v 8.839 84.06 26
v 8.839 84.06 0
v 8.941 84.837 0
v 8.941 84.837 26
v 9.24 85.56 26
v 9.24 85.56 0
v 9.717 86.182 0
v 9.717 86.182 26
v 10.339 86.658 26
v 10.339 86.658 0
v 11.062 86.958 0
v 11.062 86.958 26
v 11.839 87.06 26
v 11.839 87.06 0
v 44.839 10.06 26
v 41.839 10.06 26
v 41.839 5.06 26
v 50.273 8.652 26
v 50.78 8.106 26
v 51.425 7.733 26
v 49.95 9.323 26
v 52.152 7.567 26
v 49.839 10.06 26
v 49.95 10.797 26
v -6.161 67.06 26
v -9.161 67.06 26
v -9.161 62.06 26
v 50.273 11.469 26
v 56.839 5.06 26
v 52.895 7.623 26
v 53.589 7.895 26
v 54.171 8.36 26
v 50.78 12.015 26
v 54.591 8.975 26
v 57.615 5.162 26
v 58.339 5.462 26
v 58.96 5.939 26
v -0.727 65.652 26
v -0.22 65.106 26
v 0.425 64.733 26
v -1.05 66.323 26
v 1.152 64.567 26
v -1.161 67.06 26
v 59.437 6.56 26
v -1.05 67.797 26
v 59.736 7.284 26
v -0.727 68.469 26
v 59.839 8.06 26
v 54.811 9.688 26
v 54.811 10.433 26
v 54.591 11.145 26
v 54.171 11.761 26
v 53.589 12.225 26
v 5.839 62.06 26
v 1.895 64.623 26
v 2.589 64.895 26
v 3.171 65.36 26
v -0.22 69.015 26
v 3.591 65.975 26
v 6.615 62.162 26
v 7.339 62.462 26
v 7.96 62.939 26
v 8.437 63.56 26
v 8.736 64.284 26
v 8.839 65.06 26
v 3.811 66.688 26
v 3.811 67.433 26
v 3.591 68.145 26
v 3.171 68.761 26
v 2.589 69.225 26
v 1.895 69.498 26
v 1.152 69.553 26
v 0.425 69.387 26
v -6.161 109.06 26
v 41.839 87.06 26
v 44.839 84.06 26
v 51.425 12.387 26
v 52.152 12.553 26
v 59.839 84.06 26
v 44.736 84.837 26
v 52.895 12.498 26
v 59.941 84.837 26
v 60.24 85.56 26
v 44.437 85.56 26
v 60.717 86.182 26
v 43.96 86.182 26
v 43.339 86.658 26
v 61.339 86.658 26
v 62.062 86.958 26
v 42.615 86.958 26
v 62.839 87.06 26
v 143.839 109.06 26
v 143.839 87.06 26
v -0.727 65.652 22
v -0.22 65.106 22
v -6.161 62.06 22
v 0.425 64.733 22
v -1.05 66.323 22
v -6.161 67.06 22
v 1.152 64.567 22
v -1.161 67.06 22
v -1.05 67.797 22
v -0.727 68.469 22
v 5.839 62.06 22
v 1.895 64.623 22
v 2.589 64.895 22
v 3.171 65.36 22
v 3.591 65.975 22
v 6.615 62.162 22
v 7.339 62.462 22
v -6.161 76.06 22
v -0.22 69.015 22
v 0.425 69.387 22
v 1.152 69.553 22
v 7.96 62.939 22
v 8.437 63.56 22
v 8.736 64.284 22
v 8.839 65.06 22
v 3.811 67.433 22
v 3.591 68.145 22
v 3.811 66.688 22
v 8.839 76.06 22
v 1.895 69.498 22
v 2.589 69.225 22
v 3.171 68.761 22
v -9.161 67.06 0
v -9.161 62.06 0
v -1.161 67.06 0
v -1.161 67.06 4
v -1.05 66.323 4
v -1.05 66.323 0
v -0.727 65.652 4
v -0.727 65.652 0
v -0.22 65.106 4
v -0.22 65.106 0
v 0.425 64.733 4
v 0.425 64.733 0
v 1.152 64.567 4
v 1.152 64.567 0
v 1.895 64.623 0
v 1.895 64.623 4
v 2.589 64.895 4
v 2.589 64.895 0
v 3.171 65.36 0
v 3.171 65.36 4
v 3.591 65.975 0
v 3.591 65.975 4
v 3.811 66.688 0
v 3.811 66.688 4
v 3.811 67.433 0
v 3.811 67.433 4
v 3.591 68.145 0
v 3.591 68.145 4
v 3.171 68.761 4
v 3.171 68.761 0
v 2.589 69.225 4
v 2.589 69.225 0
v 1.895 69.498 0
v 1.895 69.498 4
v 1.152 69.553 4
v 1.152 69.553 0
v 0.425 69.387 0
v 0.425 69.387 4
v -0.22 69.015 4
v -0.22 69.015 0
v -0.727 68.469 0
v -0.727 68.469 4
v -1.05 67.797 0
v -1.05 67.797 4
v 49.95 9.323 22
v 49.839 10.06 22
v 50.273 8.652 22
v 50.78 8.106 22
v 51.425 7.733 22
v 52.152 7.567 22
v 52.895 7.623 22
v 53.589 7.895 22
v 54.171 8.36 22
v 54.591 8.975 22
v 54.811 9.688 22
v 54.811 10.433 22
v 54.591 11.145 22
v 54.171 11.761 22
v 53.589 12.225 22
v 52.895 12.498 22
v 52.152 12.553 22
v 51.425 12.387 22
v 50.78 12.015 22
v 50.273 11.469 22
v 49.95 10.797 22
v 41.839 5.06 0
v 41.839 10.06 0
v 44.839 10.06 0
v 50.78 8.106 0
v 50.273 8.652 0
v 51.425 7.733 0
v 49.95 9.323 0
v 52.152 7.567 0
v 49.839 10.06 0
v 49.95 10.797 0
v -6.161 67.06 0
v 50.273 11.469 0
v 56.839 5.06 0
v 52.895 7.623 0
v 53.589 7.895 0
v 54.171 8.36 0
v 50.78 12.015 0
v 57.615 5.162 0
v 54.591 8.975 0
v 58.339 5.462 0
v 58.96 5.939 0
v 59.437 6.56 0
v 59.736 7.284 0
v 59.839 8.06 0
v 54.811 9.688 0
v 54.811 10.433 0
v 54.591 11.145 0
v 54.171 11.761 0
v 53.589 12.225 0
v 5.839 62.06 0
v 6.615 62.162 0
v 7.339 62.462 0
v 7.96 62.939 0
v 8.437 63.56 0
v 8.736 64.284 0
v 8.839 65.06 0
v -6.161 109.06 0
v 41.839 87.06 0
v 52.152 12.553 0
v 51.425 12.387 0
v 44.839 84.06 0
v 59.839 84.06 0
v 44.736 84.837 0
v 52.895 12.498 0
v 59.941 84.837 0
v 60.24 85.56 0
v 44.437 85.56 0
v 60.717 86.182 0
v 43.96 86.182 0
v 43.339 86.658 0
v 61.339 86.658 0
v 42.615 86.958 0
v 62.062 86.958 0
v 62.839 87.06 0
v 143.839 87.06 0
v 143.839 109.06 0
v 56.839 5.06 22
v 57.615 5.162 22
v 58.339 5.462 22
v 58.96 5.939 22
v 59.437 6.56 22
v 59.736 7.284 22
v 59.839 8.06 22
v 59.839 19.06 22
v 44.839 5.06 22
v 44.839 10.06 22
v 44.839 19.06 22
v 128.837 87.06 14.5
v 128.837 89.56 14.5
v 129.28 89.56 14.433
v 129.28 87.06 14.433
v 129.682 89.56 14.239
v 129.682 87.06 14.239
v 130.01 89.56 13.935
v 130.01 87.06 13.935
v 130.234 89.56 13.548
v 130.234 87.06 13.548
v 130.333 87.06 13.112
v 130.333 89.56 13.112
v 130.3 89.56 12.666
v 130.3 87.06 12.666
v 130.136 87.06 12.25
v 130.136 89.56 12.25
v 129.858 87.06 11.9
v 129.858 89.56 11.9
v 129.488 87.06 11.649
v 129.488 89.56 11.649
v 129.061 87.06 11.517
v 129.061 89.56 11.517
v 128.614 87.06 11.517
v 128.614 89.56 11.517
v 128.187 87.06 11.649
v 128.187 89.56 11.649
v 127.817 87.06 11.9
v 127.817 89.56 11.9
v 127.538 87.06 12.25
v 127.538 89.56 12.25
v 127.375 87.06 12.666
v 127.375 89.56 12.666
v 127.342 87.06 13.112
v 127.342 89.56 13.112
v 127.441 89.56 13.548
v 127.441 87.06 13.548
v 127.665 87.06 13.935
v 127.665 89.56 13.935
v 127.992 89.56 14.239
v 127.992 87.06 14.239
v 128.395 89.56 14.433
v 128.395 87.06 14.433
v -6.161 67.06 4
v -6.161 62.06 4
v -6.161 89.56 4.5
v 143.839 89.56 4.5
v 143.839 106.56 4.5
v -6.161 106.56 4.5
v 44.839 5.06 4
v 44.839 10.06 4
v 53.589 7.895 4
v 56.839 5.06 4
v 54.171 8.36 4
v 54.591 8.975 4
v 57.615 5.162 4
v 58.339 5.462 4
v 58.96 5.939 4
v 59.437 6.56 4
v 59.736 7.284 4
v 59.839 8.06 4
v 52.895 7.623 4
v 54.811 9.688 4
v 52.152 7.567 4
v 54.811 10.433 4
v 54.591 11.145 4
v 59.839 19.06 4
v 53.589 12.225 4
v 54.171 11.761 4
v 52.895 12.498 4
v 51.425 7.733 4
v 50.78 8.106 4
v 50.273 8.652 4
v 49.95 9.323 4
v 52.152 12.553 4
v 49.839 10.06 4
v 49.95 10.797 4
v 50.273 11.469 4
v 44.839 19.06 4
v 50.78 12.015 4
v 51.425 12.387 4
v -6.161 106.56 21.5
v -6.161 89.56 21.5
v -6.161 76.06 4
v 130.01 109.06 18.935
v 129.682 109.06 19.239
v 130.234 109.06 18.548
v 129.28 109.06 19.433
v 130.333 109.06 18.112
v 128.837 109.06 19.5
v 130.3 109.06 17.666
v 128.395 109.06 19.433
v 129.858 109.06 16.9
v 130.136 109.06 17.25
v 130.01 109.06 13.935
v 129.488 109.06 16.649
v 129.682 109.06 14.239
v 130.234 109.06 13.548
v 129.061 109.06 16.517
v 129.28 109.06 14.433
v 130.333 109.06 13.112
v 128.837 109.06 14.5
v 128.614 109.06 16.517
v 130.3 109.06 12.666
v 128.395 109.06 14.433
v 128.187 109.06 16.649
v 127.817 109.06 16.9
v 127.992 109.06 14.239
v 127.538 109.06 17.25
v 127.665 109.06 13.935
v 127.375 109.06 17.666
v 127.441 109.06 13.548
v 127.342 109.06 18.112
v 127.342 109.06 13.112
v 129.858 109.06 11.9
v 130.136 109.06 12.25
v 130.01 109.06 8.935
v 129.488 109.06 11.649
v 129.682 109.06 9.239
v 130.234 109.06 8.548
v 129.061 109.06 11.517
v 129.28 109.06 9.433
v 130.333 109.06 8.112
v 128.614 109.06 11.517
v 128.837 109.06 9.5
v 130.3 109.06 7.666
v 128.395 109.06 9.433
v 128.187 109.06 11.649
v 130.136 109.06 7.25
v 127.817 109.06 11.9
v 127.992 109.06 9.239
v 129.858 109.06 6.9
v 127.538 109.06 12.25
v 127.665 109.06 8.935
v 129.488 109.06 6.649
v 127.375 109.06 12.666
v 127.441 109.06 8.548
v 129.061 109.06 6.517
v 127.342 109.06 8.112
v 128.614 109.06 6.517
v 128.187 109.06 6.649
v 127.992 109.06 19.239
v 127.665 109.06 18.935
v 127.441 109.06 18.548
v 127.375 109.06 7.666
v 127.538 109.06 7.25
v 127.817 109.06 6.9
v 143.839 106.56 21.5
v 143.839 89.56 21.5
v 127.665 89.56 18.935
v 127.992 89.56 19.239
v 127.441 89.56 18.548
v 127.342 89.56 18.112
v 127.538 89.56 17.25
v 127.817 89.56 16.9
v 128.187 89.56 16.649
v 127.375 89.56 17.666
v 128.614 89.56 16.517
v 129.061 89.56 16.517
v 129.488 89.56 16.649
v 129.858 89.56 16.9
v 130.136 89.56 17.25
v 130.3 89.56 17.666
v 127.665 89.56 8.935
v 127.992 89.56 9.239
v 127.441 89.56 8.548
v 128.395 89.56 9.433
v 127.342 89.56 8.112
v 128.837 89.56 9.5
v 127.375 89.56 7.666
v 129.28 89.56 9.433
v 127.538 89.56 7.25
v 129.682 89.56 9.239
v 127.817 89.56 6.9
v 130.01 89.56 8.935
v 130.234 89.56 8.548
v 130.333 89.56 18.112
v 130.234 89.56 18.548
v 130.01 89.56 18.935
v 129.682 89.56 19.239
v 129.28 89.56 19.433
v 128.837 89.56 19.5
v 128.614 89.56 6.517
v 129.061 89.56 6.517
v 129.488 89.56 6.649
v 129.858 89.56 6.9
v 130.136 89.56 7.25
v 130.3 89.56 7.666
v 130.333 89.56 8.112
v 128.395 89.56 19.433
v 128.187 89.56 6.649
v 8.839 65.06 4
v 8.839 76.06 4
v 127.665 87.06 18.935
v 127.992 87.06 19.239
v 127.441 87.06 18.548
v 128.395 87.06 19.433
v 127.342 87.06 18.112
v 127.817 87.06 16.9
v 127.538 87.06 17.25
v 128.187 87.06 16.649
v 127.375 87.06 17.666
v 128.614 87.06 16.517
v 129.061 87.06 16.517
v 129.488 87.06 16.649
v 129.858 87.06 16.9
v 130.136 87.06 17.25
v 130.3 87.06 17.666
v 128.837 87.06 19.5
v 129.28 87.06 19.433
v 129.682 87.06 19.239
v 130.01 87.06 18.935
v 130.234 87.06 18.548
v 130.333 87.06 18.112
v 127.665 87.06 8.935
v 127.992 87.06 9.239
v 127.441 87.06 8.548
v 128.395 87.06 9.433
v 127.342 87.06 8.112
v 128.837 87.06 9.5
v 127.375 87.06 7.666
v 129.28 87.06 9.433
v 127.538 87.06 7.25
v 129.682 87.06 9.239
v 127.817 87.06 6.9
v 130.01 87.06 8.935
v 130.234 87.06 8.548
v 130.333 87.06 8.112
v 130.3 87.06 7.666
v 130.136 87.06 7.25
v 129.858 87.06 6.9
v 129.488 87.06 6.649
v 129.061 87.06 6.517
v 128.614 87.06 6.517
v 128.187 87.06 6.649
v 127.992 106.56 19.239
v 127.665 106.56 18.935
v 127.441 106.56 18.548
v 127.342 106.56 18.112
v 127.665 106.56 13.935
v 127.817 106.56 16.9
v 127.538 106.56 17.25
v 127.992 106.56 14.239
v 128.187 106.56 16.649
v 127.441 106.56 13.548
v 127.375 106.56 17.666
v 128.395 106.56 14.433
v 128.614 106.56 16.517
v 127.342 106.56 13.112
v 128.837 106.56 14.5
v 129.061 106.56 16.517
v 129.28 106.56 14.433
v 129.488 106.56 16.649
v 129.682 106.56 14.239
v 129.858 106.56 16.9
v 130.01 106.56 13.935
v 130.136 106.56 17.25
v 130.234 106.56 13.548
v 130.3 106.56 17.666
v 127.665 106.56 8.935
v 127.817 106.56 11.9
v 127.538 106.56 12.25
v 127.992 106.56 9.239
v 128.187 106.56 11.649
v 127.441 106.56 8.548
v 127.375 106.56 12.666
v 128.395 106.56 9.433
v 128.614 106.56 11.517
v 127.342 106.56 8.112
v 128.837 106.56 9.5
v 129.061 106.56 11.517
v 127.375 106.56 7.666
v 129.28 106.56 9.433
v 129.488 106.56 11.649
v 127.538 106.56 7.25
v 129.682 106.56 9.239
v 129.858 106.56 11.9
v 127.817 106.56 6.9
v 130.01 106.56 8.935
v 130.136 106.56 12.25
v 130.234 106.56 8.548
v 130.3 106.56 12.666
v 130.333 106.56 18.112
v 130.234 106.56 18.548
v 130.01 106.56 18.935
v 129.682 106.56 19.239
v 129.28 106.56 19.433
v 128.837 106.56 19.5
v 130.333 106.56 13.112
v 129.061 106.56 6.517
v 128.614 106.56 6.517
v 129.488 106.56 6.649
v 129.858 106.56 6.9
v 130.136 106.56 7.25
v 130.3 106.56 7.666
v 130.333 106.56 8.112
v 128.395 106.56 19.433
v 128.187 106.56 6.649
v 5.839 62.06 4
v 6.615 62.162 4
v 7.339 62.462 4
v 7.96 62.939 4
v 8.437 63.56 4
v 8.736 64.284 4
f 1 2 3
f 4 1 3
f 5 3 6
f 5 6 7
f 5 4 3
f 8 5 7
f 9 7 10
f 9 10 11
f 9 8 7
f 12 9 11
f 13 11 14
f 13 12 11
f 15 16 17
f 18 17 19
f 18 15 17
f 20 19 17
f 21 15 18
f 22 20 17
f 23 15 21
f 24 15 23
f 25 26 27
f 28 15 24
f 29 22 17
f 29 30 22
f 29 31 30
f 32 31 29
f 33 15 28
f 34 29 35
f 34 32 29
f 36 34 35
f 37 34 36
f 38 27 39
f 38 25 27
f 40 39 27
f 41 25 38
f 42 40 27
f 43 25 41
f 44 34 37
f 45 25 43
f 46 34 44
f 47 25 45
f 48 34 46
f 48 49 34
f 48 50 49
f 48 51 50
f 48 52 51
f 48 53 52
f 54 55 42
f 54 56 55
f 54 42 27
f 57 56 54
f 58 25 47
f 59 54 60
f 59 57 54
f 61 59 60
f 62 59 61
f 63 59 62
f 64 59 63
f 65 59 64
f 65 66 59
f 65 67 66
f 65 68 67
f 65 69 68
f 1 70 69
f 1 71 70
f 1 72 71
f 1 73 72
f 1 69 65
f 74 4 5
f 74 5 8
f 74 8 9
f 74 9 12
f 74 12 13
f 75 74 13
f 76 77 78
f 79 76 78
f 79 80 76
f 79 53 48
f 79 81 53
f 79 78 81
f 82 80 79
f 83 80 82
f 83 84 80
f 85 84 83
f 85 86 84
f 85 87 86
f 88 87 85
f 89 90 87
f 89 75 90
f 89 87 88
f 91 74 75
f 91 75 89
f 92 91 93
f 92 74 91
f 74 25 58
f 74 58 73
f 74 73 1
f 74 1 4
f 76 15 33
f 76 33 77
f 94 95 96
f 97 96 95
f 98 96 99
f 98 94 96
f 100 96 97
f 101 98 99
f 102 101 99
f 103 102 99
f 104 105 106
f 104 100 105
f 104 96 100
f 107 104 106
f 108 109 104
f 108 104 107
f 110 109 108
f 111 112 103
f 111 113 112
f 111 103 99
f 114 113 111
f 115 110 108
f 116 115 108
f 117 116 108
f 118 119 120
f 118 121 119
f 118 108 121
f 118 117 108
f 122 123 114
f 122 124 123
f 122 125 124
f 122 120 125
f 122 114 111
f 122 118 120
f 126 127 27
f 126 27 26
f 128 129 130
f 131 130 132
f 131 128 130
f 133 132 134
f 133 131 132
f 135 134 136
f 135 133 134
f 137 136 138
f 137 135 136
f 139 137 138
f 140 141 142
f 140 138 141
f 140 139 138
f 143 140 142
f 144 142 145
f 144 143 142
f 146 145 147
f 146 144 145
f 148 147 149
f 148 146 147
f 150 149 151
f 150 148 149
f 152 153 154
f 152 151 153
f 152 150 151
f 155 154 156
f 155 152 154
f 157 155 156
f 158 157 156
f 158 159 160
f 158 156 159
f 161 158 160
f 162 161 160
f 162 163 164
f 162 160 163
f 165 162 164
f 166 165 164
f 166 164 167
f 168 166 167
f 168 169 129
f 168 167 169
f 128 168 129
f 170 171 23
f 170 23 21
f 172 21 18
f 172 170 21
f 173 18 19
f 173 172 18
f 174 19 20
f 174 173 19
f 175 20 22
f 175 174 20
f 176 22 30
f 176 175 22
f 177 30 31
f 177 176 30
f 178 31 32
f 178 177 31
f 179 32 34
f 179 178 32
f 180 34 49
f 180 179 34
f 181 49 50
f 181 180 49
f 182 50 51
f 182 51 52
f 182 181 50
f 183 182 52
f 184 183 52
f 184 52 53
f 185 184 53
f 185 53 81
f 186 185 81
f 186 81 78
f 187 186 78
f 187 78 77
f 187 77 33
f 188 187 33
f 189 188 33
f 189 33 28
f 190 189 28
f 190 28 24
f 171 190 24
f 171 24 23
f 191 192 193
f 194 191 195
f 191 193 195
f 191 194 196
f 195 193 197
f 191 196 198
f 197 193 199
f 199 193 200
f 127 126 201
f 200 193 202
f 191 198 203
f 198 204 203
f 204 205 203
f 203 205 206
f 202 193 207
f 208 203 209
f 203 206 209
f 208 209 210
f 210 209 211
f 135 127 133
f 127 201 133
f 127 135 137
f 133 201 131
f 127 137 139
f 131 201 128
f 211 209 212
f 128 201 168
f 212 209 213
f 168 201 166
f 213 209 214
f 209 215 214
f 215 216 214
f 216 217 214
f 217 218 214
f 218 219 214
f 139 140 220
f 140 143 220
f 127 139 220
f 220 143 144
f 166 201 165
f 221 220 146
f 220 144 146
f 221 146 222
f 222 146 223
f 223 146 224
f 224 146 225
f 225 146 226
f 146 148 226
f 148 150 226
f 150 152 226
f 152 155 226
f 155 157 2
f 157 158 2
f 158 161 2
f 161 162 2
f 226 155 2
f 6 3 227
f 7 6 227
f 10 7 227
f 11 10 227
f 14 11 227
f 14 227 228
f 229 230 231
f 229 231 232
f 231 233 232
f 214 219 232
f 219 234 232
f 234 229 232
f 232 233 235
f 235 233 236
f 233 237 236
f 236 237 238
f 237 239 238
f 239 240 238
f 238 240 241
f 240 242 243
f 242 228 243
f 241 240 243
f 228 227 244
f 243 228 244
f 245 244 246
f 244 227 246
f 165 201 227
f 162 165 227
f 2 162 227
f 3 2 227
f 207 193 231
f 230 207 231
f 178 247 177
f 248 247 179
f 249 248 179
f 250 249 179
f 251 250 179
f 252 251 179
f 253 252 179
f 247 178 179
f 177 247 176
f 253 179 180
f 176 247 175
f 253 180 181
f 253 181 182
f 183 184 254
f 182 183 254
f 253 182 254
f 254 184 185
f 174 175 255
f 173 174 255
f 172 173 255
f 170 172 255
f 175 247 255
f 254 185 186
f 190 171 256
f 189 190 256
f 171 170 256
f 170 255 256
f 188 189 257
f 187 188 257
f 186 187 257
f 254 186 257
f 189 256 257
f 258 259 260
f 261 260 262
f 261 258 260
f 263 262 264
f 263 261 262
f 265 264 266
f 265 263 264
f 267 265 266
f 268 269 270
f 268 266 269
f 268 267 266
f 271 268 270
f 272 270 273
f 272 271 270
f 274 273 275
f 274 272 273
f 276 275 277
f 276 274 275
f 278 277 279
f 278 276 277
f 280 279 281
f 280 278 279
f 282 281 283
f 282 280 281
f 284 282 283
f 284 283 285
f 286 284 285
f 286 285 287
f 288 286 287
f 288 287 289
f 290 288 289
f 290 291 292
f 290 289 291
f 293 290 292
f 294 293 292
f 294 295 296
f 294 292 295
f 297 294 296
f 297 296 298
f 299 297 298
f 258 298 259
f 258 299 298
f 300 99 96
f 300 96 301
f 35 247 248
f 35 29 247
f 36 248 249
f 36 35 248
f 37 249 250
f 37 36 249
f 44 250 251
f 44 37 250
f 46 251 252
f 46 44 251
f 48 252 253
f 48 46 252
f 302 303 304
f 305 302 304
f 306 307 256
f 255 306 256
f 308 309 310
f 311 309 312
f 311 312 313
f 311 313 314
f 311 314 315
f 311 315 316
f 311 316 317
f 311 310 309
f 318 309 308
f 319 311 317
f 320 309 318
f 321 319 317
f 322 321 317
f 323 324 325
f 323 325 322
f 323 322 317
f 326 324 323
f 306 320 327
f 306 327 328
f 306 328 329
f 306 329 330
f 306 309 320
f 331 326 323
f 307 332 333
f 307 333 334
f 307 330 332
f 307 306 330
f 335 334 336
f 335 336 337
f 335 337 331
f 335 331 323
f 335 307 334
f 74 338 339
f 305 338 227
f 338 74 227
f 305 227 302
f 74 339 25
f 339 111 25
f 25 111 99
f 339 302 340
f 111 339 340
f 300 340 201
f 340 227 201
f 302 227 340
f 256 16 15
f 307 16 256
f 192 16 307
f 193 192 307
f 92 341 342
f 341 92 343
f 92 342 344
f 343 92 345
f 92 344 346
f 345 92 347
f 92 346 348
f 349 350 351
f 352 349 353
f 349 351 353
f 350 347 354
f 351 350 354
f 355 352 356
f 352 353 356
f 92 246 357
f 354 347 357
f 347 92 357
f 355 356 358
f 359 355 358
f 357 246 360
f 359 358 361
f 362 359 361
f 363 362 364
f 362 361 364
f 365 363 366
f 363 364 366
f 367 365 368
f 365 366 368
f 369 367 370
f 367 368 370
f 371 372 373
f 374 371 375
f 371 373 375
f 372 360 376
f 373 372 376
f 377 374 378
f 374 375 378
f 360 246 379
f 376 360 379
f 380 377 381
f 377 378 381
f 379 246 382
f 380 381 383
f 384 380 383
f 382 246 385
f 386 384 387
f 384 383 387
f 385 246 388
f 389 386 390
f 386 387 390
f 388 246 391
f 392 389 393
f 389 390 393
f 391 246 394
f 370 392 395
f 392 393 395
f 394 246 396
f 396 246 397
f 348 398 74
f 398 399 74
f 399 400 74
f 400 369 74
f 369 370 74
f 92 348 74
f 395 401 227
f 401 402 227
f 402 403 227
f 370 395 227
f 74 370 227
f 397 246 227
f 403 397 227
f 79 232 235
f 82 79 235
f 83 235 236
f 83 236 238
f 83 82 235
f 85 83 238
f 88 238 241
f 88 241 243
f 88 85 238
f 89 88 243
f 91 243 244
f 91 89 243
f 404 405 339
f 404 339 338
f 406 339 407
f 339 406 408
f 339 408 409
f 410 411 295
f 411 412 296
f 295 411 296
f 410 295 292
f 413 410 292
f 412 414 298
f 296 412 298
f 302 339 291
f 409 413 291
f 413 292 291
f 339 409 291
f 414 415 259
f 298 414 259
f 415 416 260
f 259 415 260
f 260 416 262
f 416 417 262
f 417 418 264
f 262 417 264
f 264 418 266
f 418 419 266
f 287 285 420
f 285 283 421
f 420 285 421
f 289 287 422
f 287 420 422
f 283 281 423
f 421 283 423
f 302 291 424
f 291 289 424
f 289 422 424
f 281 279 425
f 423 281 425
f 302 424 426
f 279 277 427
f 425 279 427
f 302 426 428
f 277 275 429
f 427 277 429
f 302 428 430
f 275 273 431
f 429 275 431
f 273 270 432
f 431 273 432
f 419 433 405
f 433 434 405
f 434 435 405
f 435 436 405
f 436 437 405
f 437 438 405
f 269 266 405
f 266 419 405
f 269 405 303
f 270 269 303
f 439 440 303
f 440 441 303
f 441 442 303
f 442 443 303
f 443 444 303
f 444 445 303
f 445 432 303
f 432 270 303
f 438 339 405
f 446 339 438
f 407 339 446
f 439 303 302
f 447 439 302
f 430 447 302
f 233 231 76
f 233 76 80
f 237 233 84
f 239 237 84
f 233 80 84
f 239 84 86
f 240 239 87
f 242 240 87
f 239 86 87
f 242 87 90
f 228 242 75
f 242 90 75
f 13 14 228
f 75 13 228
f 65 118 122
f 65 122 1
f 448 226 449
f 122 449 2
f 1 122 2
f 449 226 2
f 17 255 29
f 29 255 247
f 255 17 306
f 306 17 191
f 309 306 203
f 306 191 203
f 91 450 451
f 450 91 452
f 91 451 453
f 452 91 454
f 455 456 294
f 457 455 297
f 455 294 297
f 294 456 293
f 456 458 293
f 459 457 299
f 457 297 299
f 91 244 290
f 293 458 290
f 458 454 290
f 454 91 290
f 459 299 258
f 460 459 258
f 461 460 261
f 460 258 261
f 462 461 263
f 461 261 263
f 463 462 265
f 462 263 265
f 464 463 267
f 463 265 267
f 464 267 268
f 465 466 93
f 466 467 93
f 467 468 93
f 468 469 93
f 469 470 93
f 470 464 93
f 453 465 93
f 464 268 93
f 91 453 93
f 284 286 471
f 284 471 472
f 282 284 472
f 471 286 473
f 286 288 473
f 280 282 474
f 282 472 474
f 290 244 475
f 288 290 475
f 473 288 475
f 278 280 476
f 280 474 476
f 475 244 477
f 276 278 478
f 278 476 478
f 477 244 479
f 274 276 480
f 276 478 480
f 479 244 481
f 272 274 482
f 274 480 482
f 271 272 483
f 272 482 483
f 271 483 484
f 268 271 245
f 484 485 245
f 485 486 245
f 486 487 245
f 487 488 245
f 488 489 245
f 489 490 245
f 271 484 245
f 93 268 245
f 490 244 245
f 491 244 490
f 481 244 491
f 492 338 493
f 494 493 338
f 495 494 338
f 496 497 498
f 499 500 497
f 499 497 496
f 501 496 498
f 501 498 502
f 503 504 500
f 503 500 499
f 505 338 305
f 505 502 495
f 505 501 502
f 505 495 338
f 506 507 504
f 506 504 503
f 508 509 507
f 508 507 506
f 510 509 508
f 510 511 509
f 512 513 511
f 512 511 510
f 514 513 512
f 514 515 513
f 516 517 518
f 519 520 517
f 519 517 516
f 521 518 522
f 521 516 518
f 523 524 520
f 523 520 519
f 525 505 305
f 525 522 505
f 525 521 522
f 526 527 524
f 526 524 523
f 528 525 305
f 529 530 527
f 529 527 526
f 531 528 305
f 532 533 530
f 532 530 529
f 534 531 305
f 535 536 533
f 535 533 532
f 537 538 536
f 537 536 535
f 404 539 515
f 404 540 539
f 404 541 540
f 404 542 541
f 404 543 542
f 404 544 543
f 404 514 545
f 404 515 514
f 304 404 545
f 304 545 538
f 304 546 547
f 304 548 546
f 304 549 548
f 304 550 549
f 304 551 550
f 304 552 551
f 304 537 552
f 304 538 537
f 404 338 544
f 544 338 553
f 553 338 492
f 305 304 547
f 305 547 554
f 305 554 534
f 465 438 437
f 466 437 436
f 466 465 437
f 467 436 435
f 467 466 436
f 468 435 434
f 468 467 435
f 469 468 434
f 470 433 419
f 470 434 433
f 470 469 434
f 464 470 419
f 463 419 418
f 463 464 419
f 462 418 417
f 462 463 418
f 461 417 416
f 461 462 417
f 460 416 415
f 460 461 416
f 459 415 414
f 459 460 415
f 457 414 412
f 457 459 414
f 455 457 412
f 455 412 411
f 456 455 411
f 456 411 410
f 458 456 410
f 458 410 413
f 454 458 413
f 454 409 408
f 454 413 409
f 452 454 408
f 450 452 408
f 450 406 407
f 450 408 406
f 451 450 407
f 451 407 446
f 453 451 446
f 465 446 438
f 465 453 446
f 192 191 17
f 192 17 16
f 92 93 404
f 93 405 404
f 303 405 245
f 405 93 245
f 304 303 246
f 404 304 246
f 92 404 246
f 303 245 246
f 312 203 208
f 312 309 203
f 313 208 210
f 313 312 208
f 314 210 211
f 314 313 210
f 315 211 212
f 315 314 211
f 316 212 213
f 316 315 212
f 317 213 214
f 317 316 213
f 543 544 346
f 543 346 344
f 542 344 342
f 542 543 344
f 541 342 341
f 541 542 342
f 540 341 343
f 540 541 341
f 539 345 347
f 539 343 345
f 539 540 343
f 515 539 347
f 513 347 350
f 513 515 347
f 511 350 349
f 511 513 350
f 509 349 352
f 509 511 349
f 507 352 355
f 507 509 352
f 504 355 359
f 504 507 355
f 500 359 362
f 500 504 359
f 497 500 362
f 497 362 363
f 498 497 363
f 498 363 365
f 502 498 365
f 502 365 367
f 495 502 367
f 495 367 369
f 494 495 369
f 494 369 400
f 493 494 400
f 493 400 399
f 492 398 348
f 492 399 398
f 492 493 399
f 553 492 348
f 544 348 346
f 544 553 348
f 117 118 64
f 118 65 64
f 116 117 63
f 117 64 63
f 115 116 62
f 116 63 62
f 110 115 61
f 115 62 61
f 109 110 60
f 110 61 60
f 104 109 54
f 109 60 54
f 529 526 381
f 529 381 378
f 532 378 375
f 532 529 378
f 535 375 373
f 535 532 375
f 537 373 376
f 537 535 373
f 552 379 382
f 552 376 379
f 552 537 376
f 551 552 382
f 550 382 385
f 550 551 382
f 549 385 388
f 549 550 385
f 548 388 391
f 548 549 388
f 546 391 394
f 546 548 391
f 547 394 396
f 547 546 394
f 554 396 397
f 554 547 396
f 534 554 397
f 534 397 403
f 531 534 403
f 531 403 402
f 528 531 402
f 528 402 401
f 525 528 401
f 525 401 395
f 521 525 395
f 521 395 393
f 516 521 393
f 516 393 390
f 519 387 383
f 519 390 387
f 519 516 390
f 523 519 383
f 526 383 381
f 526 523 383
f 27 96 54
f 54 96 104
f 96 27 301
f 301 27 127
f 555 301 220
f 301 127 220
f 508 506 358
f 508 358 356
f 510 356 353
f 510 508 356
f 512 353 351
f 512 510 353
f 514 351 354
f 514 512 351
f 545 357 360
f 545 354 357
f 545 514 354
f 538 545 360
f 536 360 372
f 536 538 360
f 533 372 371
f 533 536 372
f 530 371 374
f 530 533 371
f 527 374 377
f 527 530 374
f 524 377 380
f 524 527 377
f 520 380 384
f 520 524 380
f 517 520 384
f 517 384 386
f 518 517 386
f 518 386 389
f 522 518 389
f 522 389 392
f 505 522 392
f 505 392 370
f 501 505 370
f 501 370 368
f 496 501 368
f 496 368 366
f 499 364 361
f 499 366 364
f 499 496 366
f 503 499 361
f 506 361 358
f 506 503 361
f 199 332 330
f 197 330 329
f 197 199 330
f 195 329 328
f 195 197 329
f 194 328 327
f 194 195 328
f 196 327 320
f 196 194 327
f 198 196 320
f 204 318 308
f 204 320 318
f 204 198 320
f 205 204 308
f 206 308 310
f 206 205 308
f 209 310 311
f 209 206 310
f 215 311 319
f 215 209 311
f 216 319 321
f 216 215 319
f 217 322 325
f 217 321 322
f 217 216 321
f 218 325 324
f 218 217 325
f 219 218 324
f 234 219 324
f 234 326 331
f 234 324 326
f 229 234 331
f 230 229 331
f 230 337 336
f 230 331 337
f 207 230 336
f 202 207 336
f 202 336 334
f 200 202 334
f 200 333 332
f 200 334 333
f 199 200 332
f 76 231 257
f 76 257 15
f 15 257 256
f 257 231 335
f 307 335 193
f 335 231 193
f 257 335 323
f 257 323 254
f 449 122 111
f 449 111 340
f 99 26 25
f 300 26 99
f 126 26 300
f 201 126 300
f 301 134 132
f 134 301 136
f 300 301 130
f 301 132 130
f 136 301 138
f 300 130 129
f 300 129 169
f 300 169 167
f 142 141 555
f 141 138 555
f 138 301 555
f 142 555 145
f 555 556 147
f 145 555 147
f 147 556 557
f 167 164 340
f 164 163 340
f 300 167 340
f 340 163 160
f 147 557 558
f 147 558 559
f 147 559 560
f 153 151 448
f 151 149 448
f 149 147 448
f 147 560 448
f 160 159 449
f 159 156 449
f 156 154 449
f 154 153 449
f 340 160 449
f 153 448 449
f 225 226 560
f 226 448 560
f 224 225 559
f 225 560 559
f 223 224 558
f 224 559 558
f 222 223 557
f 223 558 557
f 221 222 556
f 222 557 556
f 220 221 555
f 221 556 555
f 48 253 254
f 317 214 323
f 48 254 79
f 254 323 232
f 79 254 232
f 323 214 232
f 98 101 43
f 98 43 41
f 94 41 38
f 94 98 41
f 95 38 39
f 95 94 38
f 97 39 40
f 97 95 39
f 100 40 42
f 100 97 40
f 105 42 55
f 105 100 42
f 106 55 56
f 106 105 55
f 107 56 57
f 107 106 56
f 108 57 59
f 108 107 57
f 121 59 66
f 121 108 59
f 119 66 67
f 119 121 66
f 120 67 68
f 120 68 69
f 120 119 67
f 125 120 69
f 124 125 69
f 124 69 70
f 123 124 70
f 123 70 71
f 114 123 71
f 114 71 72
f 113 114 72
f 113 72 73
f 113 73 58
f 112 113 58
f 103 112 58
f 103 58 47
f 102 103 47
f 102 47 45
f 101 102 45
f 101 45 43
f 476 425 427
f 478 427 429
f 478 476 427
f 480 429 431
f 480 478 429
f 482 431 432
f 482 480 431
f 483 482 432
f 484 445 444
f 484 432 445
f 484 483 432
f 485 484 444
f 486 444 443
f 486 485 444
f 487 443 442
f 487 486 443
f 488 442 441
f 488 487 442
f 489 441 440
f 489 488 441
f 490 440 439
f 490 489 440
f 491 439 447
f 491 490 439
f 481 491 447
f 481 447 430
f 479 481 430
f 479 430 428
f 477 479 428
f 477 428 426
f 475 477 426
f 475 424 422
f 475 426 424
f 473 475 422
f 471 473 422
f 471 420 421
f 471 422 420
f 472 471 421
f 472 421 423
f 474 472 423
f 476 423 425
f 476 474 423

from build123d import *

# Parameters (mm, degrees)
SKETCH_1_R               = 2.5
SKETCH_1_W               = 3
SKETCH_1_H               = 5
EXTRUDE_2_DEPTH          = 26
CUT_EXTRUDE_3_REACH      = 151.57
SKETCH_5_W               = 18
SKETCH_5_H               = 14
CUT_EXTRUDE_5_DEPTH      = 180.392084627
CUT_EXTRUDE_5_DEPTH_BACK = 22
SKETCH_7_R               = 1.5
SKETCH_8_W               = 17
SKETCH_8_H               = 17
CUT_EXTRUDE_6_DEPTH      = 190.681647041
SKETCH_9_W               = 18
SKETCH_9_H               = 14
CUT_EXTRUDE_7_DEPTH      = 15
FILLET_1_R               = 3
FILLET_2_R               = 3
FILLET_3_R               = 3
FILLET_4_R               = 3


with BuildPart() as part:
    # 草图1 → 凸台-拉伸2 (new body)
    # profile 1 of 3: a face of its own
    with BuildSketch(Plane.XY):
        Polygon((8.838520664, 62.0602), (8.838520664, 87.0602), (44.838520664, 87.0602), (44.838520664, 10.0602), (44.838520664, 5.0602), (59.838520664, 5.0602), (59.838520664, 87.0602), (143.838520664, 87.0602), (143.838520664, 109.0602), (-6.161479336, 109.0602), (-6.161479336, 87.0602), (-6.161479336, 67.0602), (-6.161479336, 62.0602), align=None)
        with Locations(Location((52.338520664, 10.0602, 0), (0, 0, 180))):
            Circle(SKETCH_1_R, mode=Mode.SUBTRACT)
        with Locations(Location((1.338520664, 67.0602, 0), (0, 0, 180))):
            Circle(SKETCH_1_R, mode=Mode.SUBTRACT)
    # profile 2 of 3: a face of its own
    with BuildSketch(Plane.XY):
        with Locations((-7.661479336, 64.5602)):
            Rectangle(SKETCH_1_W, SKETCH_1_H)
    # profile 3 of 3: a face of its own
    with BuildSketch(Plane.XY):
        with Locations((43.338520664, 7.5602)):
            Rectangle(SKETCH_1_W, SKETCH_1_H)
    extrude(amount=EXTRUDE_2_DEPTH)

    # 草图5 → 切除-拉伸3 (cut, up to next)
    with BuildSketch(Plane.ZY.offset(-44.838520664), mode=Mode.PRIVATE) as cut_extrude_3_sk1:
        with Locations((13, 12.0602)):
            Rectangle(SKETCH_5_W, SKETCH_5_H)
    cut_extrude_3_tool1 = extrude(cut_extrude_3_sk1.sketch, amount=-CUT_EXTRUDE_3_REACH, mode=Mode.PRIVATE) & part.part
    add(cut_extrude_3_tool1.solids().sort_by_distance((44.838521, 12.0602, 13))[0], mode=Mode.SUBTRACT)

    # 草图7 → 切除-拉伸5 (cut, two sides: drawn at the far end of the back side and taken through both)
    with BuildSketch(Plane(origin=(0, 109.0602, 0), x_dir=(1, 0, 0), z_dir=(0, 1, 0)).offset(-CUT_EXTRUDE_5_DEPTH_BACK)):
        with Locations(Location((128.837370272, -13, 0), (0, 0, 270))):
            Circle(SKETCH_7_R)
        with Locations(Location((128.837370272, -8, 0), (0, 0, 270))):
            Circle(SKETCH_7_R)
        with Locations(Location((128.837370272, -18, 0), (0, 0, 270))):
            Circle(SKETCH_7_R)
    extrude(amount=CUT_EXTRUDE_5_DEPTH + CUT_EXTRUDE_5_DEPTH_BACK, mode=Mode.SUBTRACT)

    # 草图8 → 切除-拉伸6 (cut, through all)
    with BuildSketch(Plane(origin=(143.838520664, 0, 0), x_dir=(0, 0, -1), z_dir=(1, 0, 0))):
        with Locations((-13, 98.0602)):
            Rectangle(SKETCH_8_W, SKETCH_8_H)
    extrude(amount=-CUT_EXTRUDE_6_DEPTH, mode=Mode.SUBTRACT)

    # 草图9 → 切除-拉伸7 (cut)
    with BuildSketch(Plane(origin=(8.838520664, 0, 0), x_dir=(0, 0, -1), z_dir=(1, 0, 0))):
        with Locations((-13, 69.0602)):
            Rectangle(SKETCH_9_W, SKETCH_9_H)
    extrude(amount=-CUT_EXTRUDE_7_DEPTH, mode=Mode.SUBTRACT)

    # 圆角1
    fillet_1_edges = [part.edges().sort_by_distance(p)[0] for p in [
        (59.838520664, 87.0602, 13),
        (8.838520664, 87.0602, 13),
    ]]
    fillet(fillet_1_edges, radius=FILLET_1_R)

    # 圆角2
    fillet_2_edges = [part.edges().sort_by_distance(p)[0] for p in [
        (44.838520664, 87.0602, 13),
    ]]
    fillet(fillet_2_edges, radius=FILLET_2_R)

    # 圆角3
    fillet_3_edges = [part.edges().sort_by_distance(p)[0] for p in [
        (8.838520664, 62.0602, 24),
    ]]
    fillet(fillet_3_edges, radius=FILLET_3_R)

    # 圆角4
    fillet_4_edges = [part.edges().sort_by_distance(p)[0] for p in [
        (8.838520664, 62.0602, 2),
        (59.838520664, 5.0602, 24),
        (59.838520664, 5.0602, 2),
    ]]
    fillet(fillet_4_edges, radius=FILLET_4_R)


solid = part.part
